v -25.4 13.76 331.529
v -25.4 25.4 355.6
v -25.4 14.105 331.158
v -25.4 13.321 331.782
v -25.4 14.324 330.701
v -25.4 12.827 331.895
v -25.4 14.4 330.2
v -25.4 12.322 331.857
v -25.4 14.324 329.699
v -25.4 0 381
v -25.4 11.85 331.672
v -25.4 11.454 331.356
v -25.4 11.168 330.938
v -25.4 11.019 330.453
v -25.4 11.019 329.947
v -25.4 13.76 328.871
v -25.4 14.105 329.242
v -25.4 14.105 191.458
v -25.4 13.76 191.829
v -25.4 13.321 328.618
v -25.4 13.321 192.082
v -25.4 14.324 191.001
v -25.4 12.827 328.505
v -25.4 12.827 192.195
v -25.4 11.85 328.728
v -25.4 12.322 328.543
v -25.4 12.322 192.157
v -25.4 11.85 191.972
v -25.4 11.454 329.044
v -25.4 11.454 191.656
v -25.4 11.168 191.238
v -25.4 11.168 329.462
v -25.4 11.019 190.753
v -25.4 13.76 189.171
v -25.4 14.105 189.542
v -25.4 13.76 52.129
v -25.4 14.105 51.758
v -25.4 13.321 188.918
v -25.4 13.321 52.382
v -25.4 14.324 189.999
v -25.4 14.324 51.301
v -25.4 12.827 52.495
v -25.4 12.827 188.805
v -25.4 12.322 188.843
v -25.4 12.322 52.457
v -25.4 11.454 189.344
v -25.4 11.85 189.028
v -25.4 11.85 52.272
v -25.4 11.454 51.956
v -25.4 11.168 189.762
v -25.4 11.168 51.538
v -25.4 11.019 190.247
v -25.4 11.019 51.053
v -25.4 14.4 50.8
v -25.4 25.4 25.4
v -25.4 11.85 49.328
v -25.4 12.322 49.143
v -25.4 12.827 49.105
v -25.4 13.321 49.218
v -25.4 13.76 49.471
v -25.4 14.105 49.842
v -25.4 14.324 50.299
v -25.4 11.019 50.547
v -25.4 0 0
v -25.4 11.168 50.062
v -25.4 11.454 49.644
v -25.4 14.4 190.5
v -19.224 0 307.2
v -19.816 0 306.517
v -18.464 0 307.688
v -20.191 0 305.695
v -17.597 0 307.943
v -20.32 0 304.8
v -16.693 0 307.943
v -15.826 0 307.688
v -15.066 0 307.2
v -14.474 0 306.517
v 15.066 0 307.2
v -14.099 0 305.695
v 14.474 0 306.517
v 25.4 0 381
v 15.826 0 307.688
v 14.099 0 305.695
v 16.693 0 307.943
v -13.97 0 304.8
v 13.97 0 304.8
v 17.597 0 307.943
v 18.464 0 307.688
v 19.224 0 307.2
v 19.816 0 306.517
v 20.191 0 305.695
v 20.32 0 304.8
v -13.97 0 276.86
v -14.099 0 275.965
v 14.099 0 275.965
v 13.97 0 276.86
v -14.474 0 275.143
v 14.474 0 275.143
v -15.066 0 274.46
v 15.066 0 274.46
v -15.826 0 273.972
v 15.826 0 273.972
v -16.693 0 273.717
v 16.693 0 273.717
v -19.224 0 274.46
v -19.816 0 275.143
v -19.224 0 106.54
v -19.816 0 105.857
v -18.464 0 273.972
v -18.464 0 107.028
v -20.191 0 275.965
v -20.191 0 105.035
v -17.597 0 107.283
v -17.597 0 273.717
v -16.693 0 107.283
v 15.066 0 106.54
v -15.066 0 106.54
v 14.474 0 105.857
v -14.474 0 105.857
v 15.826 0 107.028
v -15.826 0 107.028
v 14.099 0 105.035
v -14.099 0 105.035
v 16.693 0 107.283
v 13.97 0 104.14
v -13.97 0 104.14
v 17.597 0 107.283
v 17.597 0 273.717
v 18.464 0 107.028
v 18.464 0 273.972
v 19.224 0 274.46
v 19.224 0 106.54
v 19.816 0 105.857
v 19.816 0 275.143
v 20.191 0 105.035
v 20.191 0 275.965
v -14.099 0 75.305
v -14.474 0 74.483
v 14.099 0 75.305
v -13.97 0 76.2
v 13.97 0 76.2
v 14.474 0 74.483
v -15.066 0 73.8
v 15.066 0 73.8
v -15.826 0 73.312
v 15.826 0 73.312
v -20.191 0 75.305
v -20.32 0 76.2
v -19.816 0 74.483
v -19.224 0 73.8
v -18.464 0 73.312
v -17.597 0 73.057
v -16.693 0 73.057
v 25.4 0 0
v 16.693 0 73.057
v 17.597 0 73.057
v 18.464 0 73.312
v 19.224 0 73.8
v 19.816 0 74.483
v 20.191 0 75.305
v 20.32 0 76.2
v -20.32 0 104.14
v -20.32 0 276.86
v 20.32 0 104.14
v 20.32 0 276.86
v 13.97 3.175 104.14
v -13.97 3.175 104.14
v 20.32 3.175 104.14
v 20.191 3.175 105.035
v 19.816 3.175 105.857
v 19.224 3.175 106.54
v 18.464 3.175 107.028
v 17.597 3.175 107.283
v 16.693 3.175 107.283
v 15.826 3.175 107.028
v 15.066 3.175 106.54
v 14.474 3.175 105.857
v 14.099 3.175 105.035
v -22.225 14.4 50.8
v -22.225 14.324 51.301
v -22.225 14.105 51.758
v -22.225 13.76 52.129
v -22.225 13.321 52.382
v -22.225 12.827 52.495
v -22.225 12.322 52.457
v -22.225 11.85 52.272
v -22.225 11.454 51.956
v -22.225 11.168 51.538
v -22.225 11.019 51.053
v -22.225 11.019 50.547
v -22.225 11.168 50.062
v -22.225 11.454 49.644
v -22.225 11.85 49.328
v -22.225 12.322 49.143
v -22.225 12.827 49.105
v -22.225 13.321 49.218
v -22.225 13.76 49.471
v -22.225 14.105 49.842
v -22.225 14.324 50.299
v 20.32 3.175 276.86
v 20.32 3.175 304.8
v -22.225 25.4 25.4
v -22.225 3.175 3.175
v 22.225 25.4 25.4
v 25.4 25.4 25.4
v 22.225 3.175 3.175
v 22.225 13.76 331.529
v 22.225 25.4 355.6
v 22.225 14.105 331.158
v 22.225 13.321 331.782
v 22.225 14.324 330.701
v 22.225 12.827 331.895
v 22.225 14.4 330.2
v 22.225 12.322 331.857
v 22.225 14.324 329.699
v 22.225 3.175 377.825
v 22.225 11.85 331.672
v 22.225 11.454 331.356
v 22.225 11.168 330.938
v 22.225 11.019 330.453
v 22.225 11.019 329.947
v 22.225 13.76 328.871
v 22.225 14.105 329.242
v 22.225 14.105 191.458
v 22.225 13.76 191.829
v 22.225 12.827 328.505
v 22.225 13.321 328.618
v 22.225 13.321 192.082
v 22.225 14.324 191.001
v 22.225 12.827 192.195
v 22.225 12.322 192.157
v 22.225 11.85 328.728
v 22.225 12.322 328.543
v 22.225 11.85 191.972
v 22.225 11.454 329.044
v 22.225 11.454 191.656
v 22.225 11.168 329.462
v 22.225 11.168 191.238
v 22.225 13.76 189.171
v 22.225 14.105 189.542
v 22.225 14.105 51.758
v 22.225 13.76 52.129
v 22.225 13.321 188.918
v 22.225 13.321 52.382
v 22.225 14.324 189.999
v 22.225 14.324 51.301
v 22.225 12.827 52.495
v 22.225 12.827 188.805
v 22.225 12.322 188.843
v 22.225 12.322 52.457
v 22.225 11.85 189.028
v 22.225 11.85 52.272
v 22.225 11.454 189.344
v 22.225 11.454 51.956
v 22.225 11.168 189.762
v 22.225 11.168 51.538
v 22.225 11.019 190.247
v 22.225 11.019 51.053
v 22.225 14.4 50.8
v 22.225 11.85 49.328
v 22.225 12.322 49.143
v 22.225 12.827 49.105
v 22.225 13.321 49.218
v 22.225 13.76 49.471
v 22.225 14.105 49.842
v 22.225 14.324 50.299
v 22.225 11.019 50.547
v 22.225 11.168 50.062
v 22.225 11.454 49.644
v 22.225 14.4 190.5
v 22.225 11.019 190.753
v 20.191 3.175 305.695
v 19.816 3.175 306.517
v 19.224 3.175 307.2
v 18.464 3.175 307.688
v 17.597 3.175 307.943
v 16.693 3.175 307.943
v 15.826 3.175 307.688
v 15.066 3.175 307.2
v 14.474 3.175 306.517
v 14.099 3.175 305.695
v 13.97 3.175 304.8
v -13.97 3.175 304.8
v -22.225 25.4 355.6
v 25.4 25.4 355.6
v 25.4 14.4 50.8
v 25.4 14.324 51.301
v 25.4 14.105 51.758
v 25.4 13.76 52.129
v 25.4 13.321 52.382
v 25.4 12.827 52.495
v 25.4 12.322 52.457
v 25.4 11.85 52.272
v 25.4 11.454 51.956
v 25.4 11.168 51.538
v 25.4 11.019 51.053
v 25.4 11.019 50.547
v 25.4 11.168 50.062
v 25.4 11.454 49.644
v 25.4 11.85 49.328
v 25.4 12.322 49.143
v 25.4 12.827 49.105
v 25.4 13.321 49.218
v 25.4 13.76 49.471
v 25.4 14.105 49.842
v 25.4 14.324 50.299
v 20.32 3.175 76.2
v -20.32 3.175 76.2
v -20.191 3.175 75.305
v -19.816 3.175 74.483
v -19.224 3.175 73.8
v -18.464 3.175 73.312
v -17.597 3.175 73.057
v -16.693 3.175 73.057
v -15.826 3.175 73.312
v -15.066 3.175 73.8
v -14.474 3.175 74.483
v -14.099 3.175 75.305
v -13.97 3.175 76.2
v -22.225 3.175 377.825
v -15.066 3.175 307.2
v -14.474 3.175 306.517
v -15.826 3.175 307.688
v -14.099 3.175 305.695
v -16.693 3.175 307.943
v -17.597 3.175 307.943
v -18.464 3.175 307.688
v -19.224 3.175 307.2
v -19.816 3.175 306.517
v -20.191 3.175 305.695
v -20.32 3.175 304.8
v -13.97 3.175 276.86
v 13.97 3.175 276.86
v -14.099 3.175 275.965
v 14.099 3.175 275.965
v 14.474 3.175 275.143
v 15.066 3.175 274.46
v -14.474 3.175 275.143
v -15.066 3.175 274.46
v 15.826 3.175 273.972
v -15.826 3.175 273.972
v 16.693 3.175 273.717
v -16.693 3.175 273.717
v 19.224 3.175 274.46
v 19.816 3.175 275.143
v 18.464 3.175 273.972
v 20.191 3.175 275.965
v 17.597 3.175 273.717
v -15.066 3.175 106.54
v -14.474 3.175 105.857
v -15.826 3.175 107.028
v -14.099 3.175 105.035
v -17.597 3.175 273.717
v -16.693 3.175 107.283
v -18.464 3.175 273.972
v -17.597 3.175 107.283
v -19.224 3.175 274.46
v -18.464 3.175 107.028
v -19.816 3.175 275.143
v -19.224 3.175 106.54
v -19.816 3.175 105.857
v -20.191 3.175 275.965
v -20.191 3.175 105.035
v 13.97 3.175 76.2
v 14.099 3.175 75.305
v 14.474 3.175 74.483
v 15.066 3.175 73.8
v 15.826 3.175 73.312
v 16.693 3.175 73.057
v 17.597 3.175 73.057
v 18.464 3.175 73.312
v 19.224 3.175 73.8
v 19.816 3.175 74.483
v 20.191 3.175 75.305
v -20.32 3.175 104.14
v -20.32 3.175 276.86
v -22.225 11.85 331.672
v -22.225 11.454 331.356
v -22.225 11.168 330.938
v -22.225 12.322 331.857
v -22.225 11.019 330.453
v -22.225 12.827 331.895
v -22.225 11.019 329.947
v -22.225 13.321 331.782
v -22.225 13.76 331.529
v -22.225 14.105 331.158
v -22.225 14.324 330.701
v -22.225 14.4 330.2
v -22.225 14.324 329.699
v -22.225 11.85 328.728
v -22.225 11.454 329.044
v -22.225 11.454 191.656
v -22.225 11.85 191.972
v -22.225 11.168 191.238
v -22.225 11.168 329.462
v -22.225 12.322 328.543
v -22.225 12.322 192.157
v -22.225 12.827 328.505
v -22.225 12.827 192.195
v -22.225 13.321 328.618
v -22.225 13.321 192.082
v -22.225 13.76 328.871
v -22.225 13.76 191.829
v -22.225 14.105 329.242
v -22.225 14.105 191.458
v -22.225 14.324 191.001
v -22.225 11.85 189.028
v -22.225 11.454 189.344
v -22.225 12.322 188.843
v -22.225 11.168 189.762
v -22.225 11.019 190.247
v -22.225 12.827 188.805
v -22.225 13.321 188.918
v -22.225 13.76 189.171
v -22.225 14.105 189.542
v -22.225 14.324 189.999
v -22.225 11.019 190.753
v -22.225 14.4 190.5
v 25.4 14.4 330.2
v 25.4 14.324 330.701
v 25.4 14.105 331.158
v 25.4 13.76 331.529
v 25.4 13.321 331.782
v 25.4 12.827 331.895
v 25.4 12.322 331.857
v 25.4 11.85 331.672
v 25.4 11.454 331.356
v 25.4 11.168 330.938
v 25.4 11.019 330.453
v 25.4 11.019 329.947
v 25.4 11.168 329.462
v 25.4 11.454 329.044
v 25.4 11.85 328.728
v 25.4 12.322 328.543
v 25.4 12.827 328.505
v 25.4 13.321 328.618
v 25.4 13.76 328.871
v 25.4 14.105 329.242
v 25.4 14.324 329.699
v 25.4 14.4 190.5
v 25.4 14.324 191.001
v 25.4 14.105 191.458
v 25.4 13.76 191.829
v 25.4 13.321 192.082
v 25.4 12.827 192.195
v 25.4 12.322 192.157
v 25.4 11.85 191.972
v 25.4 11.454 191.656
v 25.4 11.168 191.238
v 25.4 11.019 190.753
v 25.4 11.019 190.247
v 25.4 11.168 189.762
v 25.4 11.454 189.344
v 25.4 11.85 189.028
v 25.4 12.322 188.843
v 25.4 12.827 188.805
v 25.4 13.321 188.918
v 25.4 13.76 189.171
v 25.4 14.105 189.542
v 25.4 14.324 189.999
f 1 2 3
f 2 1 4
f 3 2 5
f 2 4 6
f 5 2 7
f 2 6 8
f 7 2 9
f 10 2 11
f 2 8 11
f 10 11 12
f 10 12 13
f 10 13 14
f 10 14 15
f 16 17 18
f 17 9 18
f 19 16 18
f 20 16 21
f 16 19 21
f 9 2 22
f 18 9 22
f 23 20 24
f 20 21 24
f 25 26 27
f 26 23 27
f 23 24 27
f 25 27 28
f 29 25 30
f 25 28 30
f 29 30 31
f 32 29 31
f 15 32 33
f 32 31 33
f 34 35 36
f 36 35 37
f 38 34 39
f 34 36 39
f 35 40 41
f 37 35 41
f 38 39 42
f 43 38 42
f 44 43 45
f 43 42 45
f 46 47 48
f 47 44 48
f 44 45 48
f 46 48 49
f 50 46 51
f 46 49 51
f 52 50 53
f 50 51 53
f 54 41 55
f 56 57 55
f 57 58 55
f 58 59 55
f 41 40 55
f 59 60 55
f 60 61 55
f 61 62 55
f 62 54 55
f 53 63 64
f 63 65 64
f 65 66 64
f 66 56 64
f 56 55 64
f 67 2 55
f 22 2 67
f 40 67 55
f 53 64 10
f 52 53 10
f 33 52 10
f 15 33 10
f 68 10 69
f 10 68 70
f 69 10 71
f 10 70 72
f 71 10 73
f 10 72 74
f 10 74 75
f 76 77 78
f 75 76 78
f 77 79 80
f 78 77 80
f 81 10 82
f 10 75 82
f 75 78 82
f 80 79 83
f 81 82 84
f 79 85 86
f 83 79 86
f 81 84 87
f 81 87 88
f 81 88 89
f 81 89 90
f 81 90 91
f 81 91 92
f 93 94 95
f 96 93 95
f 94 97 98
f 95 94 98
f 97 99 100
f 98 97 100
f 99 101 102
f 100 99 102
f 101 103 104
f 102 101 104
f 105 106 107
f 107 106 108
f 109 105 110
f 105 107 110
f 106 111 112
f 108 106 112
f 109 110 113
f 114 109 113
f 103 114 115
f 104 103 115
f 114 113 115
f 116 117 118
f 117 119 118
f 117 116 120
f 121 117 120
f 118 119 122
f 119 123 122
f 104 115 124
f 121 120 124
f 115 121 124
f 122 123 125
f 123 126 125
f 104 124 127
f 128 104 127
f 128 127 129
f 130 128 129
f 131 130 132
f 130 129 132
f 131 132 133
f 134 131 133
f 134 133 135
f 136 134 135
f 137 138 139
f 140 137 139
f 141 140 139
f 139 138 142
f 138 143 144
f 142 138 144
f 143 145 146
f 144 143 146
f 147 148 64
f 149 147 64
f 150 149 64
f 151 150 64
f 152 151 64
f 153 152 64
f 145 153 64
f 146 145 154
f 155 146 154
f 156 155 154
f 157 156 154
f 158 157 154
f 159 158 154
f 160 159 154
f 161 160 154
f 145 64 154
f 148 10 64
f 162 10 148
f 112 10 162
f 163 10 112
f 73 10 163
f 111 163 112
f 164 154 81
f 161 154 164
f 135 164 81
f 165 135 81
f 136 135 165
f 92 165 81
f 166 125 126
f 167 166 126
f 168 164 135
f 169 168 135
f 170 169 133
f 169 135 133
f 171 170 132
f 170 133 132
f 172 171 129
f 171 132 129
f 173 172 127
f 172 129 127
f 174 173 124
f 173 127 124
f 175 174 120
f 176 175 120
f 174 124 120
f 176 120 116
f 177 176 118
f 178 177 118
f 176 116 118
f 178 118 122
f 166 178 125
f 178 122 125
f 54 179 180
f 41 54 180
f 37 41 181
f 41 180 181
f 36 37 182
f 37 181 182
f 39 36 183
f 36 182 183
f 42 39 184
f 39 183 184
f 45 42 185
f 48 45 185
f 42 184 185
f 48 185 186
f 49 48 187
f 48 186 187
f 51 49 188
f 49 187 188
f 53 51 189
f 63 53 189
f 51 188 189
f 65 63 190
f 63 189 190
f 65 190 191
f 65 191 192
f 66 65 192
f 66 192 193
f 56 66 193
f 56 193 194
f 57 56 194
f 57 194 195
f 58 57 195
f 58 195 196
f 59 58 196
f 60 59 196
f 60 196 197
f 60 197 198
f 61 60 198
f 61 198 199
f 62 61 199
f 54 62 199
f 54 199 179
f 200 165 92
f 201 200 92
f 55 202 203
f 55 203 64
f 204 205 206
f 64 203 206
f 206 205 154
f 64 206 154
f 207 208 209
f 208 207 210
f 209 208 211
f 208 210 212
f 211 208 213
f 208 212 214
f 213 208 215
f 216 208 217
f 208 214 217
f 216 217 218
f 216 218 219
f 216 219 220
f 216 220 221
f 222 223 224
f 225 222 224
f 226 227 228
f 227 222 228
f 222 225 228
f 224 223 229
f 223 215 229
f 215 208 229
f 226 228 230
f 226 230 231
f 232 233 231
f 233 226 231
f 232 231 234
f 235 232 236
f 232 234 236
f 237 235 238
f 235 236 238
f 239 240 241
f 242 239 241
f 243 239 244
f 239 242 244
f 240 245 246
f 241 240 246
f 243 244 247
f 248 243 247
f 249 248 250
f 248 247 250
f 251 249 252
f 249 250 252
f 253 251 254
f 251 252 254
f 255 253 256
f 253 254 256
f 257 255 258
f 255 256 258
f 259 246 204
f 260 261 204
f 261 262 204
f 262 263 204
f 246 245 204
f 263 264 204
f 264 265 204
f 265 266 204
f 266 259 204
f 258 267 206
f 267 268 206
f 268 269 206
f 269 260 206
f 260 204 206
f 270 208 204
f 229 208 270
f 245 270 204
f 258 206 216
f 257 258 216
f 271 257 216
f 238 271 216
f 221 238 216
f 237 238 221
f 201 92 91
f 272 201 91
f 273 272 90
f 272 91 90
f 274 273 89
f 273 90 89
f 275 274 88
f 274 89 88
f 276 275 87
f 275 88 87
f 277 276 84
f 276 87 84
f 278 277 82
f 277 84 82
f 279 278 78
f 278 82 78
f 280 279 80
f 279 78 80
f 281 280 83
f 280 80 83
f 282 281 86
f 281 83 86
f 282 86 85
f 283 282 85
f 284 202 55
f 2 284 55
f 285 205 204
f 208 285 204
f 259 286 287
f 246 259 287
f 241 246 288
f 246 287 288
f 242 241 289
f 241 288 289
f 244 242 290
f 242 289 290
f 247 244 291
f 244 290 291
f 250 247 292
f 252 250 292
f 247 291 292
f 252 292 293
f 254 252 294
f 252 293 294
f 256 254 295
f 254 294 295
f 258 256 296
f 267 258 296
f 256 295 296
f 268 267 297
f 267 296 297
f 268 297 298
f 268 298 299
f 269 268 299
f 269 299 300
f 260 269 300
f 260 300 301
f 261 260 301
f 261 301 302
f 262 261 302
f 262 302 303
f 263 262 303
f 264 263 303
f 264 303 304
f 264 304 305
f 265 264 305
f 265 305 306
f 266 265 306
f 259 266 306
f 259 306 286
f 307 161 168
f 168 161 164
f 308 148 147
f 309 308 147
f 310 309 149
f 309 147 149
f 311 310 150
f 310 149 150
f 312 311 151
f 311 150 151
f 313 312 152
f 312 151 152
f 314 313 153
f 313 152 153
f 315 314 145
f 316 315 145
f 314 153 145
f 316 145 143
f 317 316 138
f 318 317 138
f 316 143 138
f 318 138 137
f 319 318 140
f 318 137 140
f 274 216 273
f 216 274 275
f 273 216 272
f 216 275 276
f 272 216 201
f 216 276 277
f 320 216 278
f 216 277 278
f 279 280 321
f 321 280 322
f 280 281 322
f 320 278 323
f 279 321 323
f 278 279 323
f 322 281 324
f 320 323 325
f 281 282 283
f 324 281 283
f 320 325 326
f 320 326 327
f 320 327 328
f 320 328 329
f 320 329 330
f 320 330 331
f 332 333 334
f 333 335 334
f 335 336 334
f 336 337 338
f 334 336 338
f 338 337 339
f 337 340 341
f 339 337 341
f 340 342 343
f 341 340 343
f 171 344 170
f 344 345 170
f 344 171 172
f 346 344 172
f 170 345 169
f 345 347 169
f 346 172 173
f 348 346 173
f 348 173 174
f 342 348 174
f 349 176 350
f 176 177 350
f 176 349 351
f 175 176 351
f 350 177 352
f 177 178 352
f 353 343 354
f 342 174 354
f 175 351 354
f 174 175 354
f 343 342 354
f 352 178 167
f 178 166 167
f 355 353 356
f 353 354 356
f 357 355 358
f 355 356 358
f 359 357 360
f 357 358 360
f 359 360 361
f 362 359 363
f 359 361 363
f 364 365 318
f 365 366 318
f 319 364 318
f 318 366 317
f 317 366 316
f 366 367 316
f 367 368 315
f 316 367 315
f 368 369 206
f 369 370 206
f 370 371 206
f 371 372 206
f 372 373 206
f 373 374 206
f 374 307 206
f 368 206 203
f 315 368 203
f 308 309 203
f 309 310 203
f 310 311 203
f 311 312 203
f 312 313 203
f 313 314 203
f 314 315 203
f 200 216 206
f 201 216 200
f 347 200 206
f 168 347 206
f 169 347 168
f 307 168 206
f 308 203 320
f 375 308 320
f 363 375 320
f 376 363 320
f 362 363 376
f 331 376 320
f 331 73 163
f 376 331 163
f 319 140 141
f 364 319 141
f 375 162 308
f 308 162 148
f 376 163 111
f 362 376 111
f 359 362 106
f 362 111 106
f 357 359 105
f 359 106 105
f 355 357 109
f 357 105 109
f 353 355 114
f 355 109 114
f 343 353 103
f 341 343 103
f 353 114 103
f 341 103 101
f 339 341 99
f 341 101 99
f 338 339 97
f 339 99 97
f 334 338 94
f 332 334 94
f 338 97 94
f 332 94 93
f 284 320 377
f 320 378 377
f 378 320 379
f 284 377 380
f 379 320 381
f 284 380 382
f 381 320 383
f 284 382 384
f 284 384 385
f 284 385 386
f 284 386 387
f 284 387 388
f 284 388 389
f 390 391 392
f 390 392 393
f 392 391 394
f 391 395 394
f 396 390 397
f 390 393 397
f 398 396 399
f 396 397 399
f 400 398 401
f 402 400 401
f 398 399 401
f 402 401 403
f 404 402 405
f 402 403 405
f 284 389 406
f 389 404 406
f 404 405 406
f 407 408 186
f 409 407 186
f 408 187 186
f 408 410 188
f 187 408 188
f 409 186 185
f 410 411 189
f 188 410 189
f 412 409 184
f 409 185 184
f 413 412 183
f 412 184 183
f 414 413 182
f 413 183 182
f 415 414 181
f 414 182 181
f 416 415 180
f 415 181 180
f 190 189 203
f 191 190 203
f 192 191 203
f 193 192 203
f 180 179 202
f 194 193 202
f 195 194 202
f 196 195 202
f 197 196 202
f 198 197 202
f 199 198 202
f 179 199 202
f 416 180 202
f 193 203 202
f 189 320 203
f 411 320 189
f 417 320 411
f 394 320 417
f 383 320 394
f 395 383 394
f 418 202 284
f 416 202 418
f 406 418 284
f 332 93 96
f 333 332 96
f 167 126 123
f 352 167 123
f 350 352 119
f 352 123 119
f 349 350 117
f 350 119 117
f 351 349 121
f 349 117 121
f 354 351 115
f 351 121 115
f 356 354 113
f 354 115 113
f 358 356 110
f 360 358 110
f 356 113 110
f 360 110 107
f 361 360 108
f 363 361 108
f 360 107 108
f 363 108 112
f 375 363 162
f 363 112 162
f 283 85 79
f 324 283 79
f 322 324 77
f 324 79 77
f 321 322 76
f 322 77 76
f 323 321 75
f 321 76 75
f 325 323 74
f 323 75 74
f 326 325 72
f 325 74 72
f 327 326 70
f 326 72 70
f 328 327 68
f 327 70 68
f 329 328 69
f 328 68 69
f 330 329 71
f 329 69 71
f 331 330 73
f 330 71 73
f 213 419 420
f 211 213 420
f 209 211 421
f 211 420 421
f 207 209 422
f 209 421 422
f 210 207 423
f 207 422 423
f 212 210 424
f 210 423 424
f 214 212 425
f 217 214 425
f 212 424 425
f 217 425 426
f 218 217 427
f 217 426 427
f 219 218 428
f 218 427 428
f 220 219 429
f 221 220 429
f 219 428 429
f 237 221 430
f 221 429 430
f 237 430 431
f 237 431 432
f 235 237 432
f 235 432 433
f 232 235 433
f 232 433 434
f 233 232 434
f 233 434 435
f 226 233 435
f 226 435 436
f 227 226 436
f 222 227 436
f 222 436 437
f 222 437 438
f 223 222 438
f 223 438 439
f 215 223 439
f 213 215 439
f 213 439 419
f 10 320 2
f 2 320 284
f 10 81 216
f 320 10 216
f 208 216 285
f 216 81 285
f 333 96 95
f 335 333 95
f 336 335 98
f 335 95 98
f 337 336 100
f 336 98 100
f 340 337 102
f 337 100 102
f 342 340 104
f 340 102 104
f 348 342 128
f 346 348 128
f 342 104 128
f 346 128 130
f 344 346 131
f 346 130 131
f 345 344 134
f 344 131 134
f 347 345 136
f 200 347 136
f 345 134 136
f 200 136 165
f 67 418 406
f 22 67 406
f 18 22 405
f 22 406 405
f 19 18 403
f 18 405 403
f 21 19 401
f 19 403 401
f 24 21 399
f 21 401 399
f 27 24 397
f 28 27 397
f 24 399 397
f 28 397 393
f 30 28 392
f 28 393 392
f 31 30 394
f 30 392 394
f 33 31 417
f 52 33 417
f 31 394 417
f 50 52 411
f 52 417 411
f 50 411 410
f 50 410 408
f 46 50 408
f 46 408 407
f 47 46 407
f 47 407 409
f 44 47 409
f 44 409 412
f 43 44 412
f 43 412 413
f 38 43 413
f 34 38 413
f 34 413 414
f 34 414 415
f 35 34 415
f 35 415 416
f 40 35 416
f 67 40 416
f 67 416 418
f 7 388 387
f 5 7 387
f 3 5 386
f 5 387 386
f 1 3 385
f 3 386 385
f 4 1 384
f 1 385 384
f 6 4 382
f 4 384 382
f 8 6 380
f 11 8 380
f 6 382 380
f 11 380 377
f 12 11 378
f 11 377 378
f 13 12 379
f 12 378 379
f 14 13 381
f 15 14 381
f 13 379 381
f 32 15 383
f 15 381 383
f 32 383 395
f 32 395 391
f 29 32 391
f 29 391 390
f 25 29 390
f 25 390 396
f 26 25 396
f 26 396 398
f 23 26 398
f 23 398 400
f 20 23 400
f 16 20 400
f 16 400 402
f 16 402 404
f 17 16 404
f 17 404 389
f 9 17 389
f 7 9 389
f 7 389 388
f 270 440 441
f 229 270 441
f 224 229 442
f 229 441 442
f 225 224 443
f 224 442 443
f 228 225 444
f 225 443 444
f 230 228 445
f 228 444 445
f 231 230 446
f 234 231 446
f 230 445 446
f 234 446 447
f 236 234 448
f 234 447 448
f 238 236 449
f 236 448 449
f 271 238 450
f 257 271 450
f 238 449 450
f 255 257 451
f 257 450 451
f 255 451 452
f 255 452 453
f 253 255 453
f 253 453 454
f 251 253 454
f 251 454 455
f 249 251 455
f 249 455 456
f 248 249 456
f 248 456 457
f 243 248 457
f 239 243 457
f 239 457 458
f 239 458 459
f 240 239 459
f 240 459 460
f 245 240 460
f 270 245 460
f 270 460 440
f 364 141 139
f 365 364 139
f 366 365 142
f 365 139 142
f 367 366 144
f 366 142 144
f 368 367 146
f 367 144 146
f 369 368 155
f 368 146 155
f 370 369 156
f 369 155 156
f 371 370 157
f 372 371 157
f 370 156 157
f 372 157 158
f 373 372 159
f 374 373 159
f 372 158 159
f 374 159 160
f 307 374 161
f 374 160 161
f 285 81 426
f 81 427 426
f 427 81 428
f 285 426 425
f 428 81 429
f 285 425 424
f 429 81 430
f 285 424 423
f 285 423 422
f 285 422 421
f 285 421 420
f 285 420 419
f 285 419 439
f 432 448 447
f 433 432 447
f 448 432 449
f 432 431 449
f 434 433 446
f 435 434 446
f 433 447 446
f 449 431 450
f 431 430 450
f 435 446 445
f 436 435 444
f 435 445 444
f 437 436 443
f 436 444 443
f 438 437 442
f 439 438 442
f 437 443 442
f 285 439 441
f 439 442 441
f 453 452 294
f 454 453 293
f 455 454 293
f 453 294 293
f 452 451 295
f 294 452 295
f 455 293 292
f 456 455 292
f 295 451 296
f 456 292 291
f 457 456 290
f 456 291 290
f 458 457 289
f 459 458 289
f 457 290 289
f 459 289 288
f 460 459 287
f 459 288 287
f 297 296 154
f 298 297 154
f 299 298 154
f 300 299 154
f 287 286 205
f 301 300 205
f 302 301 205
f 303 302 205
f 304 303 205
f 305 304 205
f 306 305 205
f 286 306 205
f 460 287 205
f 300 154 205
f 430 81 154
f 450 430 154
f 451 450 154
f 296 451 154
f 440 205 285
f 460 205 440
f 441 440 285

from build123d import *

# Parameters (mm, degrees)
BOSS_EXTRUDE1_DEPTH  = 381
CUT_EXTRUDE1_DEPTH   = 51.8
CUT_EXTRUDE3_DEPTH   = 26.4
M3_CLEARANCE_HOLE1_D = 3.4


with BuildPart() as part:
    # Sketch1 → Boss-Extrude1 (new body)
    with BuildSketch(Plane.XY):
        Polygon((-25.4, 0), (25.4, 0), (25.4, 25.4), (22.225, 25.4), (22.225, 3.175), (-22.225, 3.175), (-22.225, 25.4), (-25.4, 25.4), align=None)
    extrude(amount=BOSS_EXTRUDE1_DEPTH)

    # Sketch2 → Cut-Extrude1 (cut, through all)
    with BuildSketch(Plane(origin=(25.4, 0, 0), x_dir=(0, 0, -1), z_dir=(1, 0, 0))):
        Polygon((-381, 0), (-355.6, 25.4), (-381, 25.4), align=None)
        Polygon((0, 0), (0, 25.4), (-25.4, 25.4), align=None)
    extrude(amount=-CUT_EXTRUDE1_DEPTH, mode=Mode.SUBTRACT)

    # Sketch4 → Cut-Extrude3 (cut, through all)
    with BuildSketch(Plane.XZ):
        with BuildLine():
            Line((-13.97, 276.86), (13.97, 276.86))
            ThreePointArc((13.97, 276.86), (17.145, 273.685), (20.32, 276.86))
            Line((20.32, 276.86), (20.32, 304.8))
            ThreePointArc((20.32, 304.8), (17.145, 307.975), (13.97, 304.8))
            Line((13.97, 304.8), (-13.97, 304.8))
            ThreePointArc((-13.97, 304.8), (-17.145, 307.975), (-20.32, 304.8))
            Line((-20.32, 304.8), (-20.32, 276.86))
            ThreePointArc((-20.32, 276.86), (-17.145, 273.685), (-13.97, 276.86))
        make_face()
        with BuildLine():
            Line((-20.32, 104.14), (-20.32, 76.2))
            ThreePointArc((-20.32, 76.2), (-17.145, 73.025), (-13.97, 76.2))
            Line((-13.97, 76.2), (13.97, 76.2))
            ThreePointArc((13.97, 76.2), (17.145, 73.025), (20.32, 76.2))
            Line((20.32, 76.2), (20.32, 104.14))
            ThreePointArc((20.32, 104.14), (17.145, 107.315), (13.97, 104.14))
            Line((13.97, 104.14), (-13.97, 104.14))
            ThreePointArc((-13.97, 104.14), (-17.145, 107.315), (-20.32, 104.14))
        make_face()
    extrude(amount=-CUT_EXTRUDE3_DEPTH, mode=Mode.SUBTRACT)

    # M3 Clearance Hole1 (through all)
    with Locations(Plane(origin=(-25.4, 12.7, 50.8), x_dir=(0, -1, 0), z_dir=(-1, 0, 0))):
        with Locations((0, 0), (0, 139.7), (0, 279.4)):
            Hole(M3_CLEARANCE_HOLE1_D / 2)


solid = part.part
